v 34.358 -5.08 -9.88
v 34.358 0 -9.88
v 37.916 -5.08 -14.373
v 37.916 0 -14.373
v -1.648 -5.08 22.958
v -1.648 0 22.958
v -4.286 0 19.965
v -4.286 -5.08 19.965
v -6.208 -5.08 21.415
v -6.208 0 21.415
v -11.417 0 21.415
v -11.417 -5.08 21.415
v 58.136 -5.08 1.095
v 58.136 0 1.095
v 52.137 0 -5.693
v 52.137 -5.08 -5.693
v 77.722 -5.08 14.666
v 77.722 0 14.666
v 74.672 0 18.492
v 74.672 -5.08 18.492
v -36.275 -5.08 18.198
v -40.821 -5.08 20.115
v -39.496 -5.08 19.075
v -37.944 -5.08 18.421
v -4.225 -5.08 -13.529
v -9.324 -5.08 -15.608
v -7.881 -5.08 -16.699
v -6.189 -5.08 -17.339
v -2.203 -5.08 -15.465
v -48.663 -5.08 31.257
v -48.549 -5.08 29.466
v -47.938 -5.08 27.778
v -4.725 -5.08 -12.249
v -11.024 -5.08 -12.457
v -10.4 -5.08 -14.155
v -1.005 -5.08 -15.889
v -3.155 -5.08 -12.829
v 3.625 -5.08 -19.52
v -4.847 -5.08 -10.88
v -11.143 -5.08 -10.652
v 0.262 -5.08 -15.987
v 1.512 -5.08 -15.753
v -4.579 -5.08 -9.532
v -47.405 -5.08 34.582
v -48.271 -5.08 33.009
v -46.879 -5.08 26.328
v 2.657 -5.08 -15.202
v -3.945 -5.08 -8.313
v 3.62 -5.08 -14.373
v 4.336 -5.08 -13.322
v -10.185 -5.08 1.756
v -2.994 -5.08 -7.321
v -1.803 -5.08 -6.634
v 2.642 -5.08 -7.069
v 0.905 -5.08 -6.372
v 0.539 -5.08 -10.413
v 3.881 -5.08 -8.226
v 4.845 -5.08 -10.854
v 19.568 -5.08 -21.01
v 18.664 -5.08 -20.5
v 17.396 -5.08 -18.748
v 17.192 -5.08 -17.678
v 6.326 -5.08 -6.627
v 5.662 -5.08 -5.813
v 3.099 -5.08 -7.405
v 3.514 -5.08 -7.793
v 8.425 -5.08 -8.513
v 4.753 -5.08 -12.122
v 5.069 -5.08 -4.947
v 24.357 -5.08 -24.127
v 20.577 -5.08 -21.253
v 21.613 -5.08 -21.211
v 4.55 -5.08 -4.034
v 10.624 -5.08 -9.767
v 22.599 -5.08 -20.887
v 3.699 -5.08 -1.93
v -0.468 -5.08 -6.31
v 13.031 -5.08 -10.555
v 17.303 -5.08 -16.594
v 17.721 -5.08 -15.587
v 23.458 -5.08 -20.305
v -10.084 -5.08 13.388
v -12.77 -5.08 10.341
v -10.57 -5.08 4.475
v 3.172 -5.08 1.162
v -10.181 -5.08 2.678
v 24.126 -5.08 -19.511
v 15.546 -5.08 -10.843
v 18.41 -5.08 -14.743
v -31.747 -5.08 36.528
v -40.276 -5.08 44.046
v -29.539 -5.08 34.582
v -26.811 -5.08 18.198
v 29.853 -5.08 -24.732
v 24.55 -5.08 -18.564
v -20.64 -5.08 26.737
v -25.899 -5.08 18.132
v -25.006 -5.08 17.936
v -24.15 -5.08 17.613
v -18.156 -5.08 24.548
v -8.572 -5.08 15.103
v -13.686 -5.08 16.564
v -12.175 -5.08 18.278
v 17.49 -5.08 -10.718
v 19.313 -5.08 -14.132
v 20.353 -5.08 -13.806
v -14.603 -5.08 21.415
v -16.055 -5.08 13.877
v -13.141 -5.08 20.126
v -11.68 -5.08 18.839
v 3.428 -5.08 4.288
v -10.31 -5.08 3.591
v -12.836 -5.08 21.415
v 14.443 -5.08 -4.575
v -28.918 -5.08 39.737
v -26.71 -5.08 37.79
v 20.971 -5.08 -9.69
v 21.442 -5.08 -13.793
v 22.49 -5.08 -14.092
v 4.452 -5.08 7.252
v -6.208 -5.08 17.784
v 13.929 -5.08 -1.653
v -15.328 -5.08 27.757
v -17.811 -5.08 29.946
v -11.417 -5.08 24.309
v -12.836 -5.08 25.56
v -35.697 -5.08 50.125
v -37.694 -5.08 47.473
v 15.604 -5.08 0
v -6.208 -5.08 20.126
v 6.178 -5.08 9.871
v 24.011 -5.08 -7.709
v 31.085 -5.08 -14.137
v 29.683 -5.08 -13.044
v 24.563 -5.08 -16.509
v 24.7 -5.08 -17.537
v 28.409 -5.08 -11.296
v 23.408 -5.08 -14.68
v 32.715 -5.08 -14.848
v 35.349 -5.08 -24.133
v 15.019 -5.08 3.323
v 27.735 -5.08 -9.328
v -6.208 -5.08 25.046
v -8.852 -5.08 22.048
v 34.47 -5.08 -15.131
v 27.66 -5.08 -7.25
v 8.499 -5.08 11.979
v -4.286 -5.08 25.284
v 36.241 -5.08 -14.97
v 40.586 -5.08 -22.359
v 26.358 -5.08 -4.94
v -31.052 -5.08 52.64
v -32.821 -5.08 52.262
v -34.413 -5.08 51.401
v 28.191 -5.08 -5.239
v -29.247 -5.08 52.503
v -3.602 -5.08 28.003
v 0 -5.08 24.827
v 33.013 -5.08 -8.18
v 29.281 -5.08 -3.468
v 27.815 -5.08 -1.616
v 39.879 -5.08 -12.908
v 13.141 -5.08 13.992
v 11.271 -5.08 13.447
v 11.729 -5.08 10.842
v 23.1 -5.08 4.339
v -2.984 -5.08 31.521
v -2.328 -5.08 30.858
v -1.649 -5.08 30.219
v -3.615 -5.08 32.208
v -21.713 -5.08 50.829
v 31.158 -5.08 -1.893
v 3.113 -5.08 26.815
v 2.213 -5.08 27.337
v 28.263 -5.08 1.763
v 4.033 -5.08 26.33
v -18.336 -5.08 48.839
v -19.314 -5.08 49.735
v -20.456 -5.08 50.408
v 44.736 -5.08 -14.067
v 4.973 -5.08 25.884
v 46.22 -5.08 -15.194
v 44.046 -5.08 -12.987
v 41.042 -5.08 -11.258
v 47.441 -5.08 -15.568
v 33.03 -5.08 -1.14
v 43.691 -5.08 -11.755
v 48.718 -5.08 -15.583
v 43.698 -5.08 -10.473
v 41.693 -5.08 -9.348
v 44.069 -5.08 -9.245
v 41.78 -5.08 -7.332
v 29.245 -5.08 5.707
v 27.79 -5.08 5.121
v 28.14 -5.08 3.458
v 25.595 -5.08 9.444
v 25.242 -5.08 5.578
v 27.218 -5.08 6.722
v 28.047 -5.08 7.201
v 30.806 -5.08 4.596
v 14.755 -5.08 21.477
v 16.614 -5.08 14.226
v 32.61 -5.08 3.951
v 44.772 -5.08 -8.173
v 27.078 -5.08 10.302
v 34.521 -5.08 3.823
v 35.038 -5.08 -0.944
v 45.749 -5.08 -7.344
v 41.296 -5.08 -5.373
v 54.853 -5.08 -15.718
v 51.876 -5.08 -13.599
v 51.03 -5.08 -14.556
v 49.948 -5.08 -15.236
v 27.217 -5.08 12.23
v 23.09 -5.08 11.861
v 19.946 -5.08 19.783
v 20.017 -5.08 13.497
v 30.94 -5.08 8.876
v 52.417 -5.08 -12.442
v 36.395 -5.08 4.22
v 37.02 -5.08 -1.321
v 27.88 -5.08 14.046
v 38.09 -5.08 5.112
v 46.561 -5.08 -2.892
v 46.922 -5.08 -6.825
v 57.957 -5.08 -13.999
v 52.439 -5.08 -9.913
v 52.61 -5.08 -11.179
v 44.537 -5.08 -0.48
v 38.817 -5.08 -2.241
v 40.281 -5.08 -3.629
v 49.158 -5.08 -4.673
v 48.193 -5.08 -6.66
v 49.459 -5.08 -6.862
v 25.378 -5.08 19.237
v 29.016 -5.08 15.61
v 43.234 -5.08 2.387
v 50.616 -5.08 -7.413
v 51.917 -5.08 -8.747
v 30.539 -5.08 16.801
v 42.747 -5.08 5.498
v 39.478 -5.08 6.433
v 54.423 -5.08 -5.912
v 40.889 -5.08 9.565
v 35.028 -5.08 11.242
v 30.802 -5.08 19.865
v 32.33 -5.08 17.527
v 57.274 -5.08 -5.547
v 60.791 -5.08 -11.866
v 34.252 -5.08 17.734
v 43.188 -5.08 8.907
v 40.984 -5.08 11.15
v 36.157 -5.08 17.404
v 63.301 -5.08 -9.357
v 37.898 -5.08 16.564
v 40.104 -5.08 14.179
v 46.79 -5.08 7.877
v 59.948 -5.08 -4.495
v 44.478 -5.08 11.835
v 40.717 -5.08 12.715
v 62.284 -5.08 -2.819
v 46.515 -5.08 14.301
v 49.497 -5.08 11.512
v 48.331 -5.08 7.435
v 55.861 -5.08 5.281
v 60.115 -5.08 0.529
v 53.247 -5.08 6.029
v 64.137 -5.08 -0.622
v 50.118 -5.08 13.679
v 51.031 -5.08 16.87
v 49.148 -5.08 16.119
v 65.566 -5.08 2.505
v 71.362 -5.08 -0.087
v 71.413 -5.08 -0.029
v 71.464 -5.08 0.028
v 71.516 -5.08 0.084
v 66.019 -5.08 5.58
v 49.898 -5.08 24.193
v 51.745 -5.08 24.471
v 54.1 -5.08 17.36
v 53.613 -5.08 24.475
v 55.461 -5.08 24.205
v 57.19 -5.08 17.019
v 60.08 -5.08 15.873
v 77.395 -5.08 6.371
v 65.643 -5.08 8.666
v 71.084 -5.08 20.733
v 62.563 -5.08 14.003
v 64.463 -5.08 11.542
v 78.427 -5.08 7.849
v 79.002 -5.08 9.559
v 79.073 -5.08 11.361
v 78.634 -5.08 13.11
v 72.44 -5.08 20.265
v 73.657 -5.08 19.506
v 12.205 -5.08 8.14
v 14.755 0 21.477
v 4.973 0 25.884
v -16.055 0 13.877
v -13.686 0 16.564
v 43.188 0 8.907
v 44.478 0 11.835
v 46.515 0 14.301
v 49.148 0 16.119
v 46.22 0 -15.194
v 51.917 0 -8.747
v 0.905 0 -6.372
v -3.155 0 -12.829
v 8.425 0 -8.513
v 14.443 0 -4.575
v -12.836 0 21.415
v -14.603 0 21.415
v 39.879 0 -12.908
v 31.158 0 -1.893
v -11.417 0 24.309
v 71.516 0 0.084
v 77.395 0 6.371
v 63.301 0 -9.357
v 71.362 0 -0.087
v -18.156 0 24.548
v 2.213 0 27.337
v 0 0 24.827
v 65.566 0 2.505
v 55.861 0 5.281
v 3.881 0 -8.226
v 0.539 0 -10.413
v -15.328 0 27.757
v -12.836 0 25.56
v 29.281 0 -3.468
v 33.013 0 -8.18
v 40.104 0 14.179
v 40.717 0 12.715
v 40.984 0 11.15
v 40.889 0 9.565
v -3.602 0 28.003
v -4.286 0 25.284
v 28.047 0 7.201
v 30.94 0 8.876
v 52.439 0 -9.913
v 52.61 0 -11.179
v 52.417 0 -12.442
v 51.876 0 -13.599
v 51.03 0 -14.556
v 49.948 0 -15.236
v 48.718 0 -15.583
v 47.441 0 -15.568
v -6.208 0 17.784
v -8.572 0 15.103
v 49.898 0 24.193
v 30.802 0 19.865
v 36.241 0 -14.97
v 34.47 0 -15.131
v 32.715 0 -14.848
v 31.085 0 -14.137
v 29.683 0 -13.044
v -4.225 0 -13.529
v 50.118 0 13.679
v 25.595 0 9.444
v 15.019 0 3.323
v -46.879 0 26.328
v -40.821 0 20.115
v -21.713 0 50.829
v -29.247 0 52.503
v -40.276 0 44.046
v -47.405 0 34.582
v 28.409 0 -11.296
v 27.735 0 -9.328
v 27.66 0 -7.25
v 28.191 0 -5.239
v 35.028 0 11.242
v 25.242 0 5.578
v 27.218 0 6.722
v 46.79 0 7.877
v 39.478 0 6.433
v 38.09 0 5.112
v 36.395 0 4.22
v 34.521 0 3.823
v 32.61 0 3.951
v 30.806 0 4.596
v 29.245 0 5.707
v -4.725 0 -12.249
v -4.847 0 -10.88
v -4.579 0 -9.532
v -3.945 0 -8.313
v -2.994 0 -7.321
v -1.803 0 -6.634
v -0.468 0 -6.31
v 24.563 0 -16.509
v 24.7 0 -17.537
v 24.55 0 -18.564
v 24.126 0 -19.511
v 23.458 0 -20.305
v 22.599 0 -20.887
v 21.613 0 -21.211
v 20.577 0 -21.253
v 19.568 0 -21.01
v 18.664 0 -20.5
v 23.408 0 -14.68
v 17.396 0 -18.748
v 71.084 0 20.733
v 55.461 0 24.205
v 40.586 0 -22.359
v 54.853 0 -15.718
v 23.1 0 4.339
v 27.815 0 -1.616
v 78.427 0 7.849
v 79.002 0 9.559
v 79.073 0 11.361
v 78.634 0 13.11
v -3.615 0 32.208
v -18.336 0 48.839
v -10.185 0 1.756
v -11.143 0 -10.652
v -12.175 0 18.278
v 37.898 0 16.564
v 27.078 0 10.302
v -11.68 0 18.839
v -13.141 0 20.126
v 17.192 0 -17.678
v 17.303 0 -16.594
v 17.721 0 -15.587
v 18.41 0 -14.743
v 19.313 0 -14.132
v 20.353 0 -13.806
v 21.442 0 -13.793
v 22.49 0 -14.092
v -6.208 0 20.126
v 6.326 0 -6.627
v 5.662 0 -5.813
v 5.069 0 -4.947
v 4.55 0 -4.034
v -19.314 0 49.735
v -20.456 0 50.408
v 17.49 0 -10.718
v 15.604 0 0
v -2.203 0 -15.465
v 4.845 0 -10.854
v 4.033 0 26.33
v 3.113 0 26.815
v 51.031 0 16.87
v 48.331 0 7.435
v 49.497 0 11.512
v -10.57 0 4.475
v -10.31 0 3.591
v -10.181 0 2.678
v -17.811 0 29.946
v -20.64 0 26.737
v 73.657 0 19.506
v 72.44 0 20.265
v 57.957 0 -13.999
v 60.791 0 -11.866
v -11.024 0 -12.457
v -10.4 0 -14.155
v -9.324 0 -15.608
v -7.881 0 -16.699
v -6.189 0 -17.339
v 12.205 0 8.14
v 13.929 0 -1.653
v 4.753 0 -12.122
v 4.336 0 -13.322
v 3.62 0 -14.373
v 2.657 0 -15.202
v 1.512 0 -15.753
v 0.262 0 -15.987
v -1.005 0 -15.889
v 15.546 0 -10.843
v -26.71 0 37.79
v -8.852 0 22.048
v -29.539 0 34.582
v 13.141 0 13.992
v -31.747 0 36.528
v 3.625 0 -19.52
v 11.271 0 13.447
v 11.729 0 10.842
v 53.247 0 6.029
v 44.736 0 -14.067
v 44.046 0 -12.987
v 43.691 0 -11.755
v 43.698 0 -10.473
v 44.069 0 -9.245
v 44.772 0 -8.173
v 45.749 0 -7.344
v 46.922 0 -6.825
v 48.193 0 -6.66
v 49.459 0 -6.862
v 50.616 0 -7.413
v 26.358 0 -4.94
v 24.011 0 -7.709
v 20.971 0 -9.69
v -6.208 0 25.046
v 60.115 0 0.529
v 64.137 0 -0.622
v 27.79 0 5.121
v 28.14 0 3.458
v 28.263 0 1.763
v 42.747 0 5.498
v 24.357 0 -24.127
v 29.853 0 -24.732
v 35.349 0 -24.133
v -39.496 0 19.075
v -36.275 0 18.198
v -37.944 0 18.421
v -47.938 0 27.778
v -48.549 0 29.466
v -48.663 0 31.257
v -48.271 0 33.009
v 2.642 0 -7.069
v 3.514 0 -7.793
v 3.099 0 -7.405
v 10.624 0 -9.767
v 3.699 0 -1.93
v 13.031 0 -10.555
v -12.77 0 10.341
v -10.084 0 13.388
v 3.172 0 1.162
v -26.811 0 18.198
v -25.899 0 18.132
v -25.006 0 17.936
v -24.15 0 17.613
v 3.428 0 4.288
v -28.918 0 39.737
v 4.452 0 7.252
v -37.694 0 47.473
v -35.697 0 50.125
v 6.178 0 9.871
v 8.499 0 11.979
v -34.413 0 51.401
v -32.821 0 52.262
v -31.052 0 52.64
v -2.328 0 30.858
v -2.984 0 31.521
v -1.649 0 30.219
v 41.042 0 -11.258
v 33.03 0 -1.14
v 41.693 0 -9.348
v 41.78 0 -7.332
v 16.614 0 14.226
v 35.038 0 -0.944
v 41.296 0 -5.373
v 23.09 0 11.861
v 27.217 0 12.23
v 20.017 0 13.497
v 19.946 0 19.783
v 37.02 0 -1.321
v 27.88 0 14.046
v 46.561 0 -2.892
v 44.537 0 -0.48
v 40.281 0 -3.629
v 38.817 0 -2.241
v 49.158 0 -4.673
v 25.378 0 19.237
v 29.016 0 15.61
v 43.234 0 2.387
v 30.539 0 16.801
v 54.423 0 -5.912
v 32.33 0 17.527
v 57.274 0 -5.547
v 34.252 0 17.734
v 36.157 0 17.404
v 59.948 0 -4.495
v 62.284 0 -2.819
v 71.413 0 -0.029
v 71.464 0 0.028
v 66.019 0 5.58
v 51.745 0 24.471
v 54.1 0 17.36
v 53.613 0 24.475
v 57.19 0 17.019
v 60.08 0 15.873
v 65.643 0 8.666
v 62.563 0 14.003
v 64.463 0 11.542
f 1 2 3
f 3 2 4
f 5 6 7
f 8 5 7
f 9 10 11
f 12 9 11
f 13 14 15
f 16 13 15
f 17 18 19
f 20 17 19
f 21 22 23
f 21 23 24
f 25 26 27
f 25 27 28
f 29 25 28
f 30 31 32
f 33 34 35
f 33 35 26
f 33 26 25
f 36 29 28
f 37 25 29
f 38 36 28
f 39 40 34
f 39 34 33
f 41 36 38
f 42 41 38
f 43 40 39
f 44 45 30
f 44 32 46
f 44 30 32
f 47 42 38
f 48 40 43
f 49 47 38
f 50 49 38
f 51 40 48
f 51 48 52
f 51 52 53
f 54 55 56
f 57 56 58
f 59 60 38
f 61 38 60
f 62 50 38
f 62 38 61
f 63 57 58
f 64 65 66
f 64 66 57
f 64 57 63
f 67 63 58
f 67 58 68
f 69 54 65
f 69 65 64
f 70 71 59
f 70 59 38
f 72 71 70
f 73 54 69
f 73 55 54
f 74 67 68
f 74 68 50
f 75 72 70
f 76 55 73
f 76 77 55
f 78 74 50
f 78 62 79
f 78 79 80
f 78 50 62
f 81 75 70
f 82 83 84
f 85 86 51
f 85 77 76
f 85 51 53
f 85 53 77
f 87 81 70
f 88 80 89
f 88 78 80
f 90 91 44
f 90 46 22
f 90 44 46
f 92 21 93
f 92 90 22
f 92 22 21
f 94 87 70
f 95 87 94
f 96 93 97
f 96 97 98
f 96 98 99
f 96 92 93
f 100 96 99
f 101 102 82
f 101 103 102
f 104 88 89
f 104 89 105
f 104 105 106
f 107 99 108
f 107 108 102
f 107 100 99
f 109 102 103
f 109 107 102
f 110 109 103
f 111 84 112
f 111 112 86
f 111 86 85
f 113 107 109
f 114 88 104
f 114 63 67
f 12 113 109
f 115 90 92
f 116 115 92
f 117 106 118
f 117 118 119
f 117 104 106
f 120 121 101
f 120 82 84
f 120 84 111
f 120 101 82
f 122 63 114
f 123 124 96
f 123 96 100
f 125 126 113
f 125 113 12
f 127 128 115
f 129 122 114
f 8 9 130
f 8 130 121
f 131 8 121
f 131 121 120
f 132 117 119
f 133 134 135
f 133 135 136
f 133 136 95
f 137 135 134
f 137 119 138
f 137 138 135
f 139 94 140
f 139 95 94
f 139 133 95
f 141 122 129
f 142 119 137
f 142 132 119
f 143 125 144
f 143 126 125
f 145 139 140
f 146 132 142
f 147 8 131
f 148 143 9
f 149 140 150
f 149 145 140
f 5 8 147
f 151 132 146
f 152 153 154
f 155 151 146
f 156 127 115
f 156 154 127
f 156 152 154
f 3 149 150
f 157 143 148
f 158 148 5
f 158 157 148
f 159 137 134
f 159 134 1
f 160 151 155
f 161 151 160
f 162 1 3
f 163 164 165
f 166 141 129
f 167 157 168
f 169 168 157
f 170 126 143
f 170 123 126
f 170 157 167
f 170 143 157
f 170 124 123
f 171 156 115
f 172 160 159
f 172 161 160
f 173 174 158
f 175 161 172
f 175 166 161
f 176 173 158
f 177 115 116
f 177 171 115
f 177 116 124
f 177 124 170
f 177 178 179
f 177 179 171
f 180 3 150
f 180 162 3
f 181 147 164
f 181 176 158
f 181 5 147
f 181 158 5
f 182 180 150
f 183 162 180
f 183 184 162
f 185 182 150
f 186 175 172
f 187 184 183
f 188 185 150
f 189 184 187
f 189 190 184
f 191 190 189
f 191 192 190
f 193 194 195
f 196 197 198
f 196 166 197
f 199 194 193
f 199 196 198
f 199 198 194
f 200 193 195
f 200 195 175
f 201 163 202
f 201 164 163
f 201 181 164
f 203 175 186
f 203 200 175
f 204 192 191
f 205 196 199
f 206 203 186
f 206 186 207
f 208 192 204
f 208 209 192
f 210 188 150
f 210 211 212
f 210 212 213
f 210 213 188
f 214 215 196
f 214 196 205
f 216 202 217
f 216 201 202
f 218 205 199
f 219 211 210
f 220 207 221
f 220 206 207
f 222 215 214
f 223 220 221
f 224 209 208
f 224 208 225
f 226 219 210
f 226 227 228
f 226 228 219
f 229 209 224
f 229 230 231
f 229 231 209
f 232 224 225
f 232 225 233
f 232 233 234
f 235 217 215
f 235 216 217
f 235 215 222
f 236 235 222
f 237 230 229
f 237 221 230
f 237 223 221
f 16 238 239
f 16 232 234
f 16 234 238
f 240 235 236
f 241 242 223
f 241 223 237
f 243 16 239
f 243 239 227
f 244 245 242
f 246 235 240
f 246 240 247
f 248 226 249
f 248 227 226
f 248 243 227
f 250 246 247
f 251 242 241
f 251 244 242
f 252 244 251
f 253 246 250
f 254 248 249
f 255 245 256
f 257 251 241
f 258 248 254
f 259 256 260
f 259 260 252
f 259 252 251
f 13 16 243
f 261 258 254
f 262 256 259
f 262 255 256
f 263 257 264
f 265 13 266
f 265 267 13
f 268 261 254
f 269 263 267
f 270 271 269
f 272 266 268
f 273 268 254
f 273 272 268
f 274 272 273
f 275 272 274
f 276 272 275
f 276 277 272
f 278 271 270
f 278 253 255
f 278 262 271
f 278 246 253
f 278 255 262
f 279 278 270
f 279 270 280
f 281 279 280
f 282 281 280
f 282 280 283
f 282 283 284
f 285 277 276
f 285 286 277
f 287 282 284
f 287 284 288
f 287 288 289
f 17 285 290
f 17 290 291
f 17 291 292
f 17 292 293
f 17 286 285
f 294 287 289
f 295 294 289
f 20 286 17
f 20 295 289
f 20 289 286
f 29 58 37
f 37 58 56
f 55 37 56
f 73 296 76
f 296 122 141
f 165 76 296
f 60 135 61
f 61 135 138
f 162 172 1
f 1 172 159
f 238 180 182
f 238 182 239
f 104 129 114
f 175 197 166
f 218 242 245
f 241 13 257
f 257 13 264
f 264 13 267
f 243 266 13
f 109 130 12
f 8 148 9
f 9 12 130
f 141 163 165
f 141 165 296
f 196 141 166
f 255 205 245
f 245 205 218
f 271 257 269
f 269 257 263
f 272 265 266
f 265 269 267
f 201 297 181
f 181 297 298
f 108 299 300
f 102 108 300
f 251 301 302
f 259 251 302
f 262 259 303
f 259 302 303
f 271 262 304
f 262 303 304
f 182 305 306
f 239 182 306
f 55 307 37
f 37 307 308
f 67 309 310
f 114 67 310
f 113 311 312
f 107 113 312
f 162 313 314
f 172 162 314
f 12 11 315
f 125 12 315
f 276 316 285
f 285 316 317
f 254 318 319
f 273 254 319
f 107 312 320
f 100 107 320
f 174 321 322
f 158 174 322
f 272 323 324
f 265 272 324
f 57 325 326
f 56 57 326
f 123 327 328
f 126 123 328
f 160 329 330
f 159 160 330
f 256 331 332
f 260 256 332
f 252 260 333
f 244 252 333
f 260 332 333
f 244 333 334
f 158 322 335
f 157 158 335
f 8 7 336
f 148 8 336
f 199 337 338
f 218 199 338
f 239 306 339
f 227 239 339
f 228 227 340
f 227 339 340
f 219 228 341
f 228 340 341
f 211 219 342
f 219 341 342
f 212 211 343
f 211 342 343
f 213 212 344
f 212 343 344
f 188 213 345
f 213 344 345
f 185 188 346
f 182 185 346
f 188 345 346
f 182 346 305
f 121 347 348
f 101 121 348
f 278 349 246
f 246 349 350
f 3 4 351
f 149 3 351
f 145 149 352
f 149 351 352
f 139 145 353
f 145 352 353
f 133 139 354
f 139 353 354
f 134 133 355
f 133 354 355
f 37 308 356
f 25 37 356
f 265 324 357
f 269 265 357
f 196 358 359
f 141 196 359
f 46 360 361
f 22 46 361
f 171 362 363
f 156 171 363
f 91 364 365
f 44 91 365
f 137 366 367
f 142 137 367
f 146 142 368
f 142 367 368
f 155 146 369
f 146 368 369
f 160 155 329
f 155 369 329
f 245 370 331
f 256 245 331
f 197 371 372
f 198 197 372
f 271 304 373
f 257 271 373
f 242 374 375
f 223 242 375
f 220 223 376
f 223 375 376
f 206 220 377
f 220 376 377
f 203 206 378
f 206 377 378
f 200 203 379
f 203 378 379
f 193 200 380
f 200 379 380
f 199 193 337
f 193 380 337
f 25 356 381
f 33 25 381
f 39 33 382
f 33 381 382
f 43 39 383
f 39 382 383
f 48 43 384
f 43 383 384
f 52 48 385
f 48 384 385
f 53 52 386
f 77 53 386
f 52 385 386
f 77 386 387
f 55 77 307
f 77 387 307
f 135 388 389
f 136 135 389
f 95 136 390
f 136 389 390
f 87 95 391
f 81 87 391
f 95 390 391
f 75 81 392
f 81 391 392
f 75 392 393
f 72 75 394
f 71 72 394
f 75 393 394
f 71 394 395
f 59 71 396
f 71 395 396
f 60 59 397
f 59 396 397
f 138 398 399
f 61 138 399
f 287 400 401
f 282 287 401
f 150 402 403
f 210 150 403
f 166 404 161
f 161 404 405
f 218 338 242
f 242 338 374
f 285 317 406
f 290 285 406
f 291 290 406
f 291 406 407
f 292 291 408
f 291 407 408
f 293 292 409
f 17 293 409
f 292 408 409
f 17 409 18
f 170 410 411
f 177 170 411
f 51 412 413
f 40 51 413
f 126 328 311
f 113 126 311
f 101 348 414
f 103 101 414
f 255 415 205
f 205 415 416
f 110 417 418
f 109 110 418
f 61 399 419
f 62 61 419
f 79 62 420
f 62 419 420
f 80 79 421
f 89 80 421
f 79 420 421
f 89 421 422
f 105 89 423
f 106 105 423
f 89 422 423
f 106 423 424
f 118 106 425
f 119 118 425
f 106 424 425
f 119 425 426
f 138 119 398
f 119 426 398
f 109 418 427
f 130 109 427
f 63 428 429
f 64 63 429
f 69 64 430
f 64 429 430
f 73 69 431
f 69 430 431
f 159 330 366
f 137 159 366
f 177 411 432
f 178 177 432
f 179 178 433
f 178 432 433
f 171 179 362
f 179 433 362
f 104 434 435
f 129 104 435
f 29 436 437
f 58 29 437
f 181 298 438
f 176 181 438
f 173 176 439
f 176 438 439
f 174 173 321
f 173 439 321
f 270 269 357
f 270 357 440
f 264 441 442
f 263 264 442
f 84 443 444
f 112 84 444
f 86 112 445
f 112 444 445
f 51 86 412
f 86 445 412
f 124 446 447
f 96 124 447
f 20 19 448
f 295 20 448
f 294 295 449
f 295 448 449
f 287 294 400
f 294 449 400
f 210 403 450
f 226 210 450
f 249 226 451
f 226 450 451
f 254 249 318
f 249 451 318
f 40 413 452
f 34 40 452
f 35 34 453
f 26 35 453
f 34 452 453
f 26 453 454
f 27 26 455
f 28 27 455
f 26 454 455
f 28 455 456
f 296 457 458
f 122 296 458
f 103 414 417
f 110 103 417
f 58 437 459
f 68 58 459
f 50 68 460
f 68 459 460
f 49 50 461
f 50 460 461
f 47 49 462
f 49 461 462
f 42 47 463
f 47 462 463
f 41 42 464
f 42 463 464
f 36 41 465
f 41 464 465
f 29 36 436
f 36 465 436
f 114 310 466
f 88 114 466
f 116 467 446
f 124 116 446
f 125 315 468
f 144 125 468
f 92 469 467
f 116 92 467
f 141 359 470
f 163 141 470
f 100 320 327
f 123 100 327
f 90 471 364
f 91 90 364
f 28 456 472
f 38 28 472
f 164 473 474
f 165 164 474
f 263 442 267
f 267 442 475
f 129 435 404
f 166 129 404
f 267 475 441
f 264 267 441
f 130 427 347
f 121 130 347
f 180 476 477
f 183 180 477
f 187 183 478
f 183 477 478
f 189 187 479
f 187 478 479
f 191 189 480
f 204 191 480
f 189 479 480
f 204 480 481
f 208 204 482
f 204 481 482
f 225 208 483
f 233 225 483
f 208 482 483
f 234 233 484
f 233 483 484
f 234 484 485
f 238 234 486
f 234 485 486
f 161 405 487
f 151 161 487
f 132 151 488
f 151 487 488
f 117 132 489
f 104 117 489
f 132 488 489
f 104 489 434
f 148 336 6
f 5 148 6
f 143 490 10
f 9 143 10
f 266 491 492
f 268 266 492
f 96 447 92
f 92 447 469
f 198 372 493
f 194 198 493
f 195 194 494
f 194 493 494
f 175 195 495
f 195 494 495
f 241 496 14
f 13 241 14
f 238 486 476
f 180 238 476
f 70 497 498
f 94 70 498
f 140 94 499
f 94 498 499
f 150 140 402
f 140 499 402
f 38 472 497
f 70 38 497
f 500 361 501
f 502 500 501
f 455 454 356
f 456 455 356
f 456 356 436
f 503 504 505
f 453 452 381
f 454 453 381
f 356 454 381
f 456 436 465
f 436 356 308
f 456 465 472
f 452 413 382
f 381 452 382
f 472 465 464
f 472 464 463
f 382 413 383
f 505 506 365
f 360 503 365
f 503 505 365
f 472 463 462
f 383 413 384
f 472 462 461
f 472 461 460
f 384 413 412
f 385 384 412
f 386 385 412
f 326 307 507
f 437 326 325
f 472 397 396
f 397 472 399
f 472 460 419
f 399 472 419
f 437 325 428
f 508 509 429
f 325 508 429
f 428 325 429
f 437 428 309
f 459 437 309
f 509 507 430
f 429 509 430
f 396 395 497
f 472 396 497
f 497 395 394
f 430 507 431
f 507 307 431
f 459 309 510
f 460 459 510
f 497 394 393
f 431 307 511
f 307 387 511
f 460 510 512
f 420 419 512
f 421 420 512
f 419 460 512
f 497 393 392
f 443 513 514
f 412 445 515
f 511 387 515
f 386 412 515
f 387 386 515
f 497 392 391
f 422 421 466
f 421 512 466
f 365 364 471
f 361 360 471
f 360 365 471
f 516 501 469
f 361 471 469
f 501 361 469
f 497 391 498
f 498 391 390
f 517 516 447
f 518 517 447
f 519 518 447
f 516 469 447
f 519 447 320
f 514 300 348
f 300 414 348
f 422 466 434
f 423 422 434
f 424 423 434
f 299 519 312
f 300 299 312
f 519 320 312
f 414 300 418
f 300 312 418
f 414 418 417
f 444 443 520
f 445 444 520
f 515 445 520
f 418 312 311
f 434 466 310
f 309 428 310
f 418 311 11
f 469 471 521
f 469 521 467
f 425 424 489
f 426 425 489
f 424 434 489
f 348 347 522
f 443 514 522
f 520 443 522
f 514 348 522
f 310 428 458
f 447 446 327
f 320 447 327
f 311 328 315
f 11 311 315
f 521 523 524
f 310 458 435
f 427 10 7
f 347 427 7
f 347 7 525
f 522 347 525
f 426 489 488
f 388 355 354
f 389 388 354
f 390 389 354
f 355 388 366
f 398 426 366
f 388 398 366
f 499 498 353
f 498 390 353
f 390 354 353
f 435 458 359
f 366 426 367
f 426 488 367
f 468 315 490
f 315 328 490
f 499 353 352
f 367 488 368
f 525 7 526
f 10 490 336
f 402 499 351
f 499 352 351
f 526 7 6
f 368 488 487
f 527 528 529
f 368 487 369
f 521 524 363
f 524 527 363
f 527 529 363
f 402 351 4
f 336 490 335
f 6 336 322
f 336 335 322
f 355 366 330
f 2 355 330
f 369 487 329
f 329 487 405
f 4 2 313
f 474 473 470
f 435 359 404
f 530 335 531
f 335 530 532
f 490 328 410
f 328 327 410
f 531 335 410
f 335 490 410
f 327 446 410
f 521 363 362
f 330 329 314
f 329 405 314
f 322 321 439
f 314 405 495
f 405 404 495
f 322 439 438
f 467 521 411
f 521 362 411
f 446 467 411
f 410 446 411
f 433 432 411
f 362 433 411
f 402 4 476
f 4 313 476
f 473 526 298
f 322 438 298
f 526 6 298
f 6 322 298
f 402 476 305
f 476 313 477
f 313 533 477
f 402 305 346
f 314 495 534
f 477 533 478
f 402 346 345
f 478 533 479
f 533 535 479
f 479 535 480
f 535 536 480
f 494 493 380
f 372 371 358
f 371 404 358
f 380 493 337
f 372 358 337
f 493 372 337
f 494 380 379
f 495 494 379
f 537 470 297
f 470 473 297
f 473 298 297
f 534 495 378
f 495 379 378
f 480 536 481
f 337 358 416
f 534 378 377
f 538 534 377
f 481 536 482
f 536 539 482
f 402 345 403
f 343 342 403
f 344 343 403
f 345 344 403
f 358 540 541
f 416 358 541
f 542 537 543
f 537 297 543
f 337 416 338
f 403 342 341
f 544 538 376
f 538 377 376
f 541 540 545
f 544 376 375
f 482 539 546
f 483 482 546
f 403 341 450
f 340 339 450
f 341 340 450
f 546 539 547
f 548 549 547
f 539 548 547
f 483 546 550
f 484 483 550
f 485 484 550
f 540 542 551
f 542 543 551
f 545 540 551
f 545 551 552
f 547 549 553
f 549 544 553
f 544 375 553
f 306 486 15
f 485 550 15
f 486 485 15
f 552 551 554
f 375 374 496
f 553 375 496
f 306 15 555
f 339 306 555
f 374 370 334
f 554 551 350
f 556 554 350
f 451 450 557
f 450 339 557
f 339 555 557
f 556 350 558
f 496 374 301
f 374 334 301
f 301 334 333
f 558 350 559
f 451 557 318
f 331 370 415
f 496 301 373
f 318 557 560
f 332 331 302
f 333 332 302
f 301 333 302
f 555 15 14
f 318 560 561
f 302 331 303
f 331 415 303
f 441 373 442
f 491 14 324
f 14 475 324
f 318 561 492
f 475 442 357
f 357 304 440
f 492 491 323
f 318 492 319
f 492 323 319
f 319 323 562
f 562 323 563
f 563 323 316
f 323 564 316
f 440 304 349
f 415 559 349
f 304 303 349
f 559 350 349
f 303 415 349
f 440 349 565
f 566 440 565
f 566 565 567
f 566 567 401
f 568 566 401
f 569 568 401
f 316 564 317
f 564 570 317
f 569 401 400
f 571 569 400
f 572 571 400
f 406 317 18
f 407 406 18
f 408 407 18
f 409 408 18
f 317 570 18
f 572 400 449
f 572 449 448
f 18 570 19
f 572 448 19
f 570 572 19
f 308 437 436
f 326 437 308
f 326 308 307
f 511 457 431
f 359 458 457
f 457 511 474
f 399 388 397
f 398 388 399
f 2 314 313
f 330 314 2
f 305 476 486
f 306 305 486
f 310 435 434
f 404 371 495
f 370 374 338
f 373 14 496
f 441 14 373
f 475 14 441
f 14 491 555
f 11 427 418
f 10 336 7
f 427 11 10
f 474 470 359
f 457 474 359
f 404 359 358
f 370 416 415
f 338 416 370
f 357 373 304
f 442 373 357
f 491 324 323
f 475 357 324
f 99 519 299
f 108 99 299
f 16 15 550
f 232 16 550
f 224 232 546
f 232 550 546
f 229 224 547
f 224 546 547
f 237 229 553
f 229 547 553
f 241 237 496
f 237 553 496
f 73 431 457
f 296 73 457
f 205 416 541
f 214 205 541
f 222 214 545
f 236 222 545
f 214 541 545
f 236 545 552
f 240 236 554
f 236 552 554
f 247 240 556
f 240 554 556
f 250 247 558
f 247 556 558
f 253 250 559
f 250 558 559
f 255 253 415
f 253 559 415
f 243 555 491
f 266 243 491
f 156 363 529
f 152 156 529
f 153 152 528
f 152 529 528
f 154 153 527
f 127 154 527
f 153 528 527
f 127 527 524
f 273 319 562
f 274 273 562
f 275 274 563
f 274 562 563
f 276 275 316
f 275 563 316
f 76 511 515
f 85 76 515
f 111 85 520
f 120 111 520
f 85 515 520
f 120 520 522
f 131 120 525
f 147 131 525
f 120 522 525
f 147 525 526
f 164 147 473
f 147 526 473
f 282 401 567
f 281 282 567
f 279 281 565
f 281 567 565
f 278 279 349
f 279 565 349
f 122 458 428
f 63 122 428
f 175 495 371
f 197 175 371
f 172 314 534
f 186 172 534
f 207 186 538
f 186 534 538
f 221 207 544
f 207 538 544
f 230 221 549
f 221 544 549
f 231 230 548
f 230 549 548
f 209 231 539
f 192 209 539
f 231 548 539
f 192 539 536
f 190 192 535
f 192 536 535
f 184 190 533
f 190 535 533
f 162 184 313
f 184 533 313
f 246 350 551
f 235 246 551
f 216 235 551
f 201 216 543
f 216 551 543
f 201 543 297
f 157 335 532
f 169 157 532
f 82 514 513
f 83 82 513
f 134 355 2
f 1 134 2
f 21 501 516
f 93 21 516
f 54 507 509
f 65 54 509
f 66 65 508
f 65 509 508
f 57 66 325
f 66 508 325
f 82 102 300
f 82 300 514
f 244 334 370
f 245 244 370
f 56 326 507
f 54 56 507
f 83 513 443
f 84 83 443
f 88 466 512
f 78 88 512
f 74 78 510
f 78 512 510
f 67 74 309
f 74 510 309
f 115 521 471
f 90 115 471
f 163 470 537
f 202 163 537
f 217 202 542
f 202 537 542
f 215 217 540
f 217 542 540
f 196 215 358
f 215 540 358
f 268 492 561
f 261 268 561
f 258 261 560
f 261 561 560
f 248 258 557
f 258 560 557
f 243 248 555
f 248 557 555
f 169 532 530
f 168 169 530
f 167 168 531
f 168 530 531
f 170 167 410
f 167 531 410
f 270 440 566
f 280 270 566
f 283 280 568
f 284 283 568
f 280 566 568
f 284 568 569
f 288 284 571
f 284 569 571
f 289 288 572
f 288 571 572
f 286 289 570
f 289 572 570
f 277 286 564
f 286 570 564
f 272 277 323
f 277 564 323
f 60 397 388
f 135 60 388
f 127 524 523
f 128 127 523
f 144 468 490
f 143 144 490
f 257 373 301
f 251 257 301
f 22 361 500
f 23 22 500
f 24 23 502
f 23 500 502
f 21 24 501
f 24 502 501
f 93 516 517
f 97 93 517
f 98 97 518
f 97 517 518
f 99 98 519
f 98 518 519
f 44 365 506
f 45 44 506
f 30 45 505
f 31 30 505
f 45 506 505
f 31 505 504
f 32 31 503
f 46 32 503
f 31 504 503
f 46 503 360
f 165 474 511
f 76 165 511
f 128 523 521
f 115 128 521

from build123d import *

# Parameters (mm, degrees)
F1_DEPTH = 5.08


with BuildPart() as f1:
    # F0 (on Front) → F1 (new body)
    with BuildSketch(Plane.XZ):
        with BuildLine():
            Line((-40.275556, 44.046157), (-47.404758, 34.581525))
            ThreePointArc((-47.404758, 34.581525), (-48.669842, 30.357517), (-46.879273, 26.328058))
            Line((-46.879273, 26.328058), (-40.821373, 20.114827))
            ThreePointArc((-40.821373, 20.114827), (-38.741891, 18.696625), (-36.274772, 18.197764))
            Line((-36.274772, 18.197764), (-26.811405, 18.197764))
            ThreePointArc((-26.811405, 18.197764), (-25.449181, 18.049928), (-24.150386, 17.613306))
            Line((-24.150386, 17.613306), (-16.054588, 13.876783))
            Line((-16.054588, 13.876783), (-13.685921, 16.563832))
            Line((-13.685921, 16.563832), (-10.083565, 13.38831))
            Line((-10.083565, 13.38831), (-12.769917, 10.340875))
            Line((-12.769917, 10.340875), (-10.570144, 4.47481))
            ThreePointArc((-10.570144, 4.47481), (-10.228729, 3.136696), (-10.184672, 1.756416))
            Line((-10.184672, 1.756416), (-11.142575, -10.651773))
            ThreePointArc((-11.142575, -10.651773), (-9.914032, -14.920187), (-6.188922, -17.339322))
            Line((-6.188922, -17.339322), (3.625042, -19.520204))
            Line((3.625042, -19.520204), (24.356571, -24.127213))
            ThreePointArc((24.356571, -24.127213), (32.617279, -24.582682), (40.58616, -22.359246))
            Line((40.58616, -22.359246), (54.85313, -15.717725))
            ThreePointArc((54.85313, -15.717725), (59.411476, -12.982062), (63.300546, -9.357493))
            Line((63.300546, -9.357493), (71.362269, -0.086524))
            ThreePointArc((71.362269, -0.086524), (71.438277, -0.000693), (71.515821, 0.083752))
            Line((71.515821, 0.083752), (77.39452, 6.370687))
            ThreePointArc((77.39452, 6.370687), (79.101388, 10.457233), (77.721958, 14.66561))
            Line((77.721958, 14.66561), (74.67214, 18.491938))
            ThreePointArc((74.67214, 18.491938), (73.070176, 19.919962), (71.084022, 20.732817))
            Line((71.084022, 20.732817), (55.460665, 24.204676))
            ThreePointArc((55.460665, 24.204676), (52.678779, 24.507072), (49.898197, 24.192908))
            Line((49.898197, 24.192908), (30.802289, 19.864502))
            ThreePointArc((30.802289, 19.864502), (22.647473, 19.363428), (14.755452, 21.477216))
            Line((14.755452, 21.477216), (4.972792, 25.88382))
            ThreePointArc((4.972792, 25.88382), (3.570361, 26.568119), (2.212597, 27.337246))
            Line((2.212597, 27.337246), (0, 24.827245))
            Line((0, 24.827245), (-3.602356, 28.002767))
            Line((-3.602356, 28.002767), (-1.648816, 30.21889))
            ThreePointArc((-1.648816, 30.21889), (-2.65924, 31.186265), (-3.614876, 32.207799))
            Line((-3.614876, 32.207799), (-18.335917, 48.839203))
            ThreePointArc((-18.335917, 48.839203), (-19.867203, 50.101377), (-21.713309, 50.82926))
            Line((-21.713309, 50.82926), (-29.24698, 52.50341))
            ThreePointArc((-29.24698, 52.50341), (-32.821418, 52.262474), (-35.696574, 50.125153))
            Line((-35.696574, 50.125153), (-37.694322, 47.472969))
            Line((-37.694322, 47.472969), (-28.918262, 39.736762))
            Line((-28.918262, 39.736762), (-31.746839, 36.527986))
            Line((-31.746839, 36.527986), (-40.275556, 44.046157))
        make_face()
        with BuildLine():
            ThreePointArc((-4.225081, -13.529201), (-3.944831, -8.312931), (0.905035, -6.372102))
            Line((0.905035, -6.372102), (-3.15545, -12.829451))
            Line((-3.15545, -12.829451), (-4.225081, -13.529201))
        make_face(mode=Mode.SUBTRACT)
        with BuildLine():
            ThreePointArc((4.845113, -10.854332), (2.657107, -15.202162), (-2.203116, -15.465267))
            Line((-2.203116, -15.465267), (4.845113, -10.854332))
        make_face(mode=Mode.SUBTRACT)
        with BuildLine():
            ThreePointArc((2.641534, -7.068762), (3.312281, -7.592883), (3.881143, -8.226128))
            Line((3.881143, -8.226128), (0.53884, -10.412655))
            Line((0.53884, -10.412655), (2.641534, -7.068762))
        make_face(mode=Mode.SUBTRACT)
        with BuildLine():
            Line((8.424729, -8.512556), (14.443013, -4.575408))
            Line((14.443013, -4.575408), (15.546219, -10.843349))
            ThreePointArc((15.546219, -10.843349), (11.807481, -10.221791), (8.424729, -8.512556))
        make_face(mode=Mode.SUBTRACT)
        with BuildLine():
            Line((4.550004, -4.03374), (12.205012, 8.139946))
            Line((12.205012, 8.139946), (13.928658, -1.653066))
            Line((13.928658, -1.653066), (6.326088, -6.62665))
            ThreePointArc((6.326088, -6.62665), (5.356567, -5.386006), (4.550004, -4.03374))
        make_face(mode=Mode.SUBTRACT)
        with BuildLine():
            ThreePointArc((3.698579, -1.929555), (4.451633, 7.252294), (11.270996, 13.446624))
            Line((11.270996, 13.446624), (11.729453, 10.841867))
            Line((11.729453, 10.841867), (3.698579, -1.929555))
        make_face(mode=Mode.SUBTRACT)
        with BuildLine():
            ThreePointArc((24.562505, -16.508693), (23.048976, -20.625797), (18.664287, -20.500059))
            Line((18.664287, -20.500059), (24.562505, -16.508693))
        make_face(mode=Mode.SUBTRACT)
        with BuildLine():
            ThreePointArc((17.396329, -18.748226), (18.839082, -14.40465), (23.407693, -14.680293))
            Line((23.407693, -14.680293), (17.396329, -18.748226))
        make_face(mode=Mode.SUBTRACT)
        with BuildLine():
            ThreePointArc((28.408875, -11.295958), (27.6599, -7.249786), (29.281339, -3.467801))
            Line((29.281339, -3.467801), (33.01283, -8.18043))
            Line((33.01283, -8.18043), (28.408875, -11.295958))
        make_face(mode=Mode.SUBTRACT)
        with BuildLine():
            Line((29.683054, -13.043582), (34.358372, -9.879761))
            Line((34.358372, -9.879761), (37.916162, -14.373018))
            ThreePointArc((37.916162, -14.373018), (33.583819, -15.044666), (29.683054, -13.043582))
        make_face(mode=Mode.SUBTRACT)
        with BuildLine():
            ThreePointArc((44.73614, -14.067125), (44.771689, -8.173226), (50.616499, -7.413293))
            Line((50.616499, -7.413293), (44.73614, -14.067125))
        make_face(mode=Mode.SUBTRACT)
        with BuildLine():
            Line((39.879447, -12.907889), (31.157593, -1.892757))
            ThreePointArc((31.157593, -1.892757), (40.281312, -3.629113), (39.879447, -12.907889))
        make_face(mode=Mode.SUBTRACT)
        with BuildLine():
            ThreePointArc((51.917324, -8.746926), (51.486914, -14.107842), (46.21959, -15.194111))
            Line((46.21959, -15.194111), (51.917324, -8.746926))
        make_face(mode=Mode.SUBTRACT)
        with BuildLine():
            Line((17.489936, -10.717827), (15.603516, 0))
            Line((15.603516, 0), (23.100192, 4.338584))
            Line((23.100192, 4.338584), (27.815175, -1.616132))
            ThreePointArc((27.815175, -1.616132), (24.011433, -7.708531), (17.489936, -10.717827))
        make_face(mode=Mode.SUBTRACT)
        with BuildLine():
            Line((28.262959, 1.762977), (25.24207, 5.578162))
            Line((25.24207, 5.578162), (27.217829, 6.721602))
            ThreePointArc((27.217829, 6.721602), (27.993249, 4.295584), (28.262959, 1.762977))
        make_face(mode=Mode.SUBTRACT)
        with BuildLine():
            ThreePointArc((13.140761, 13.992305), (20.017468, 13.496749), (25.594964, 9.443823))
            Line((25.594964, 9.443823), (15.018651, 3.322948))
            Line((15.018651, 3.322948), (13.140761, 13.992305))
        make_face(mode=Mode.SUBTRACT)
        with BuildLine():
            Line((30.93997, 8.875732), (39.47801, 6.432929))
            ThreePointArc((39.47801, 6.432929), (33.560944, 3.82119), (28.046584, 7.201231))
            Line((28.046584, 7.201231), (30.93997, 8.875732))
        make_face(mode=Mode.SUBTRACT)
        with BuildLine():
            Line((40.888753, 9.564819), (35.028014, 11.241624))
            Line((35.028014, 11.241624), (40.103703, 14.1791))
            ThreePointArc((40.103703, 14.1791), (40.895382, 11.939869), (40.888753, 9.564819))
        make_face(mode=Mode.SUBTRACT)
        with BuildLine():
            Line((46.789589, 7.876541), (43.188322, 8.906893))
            ThreePointArc((43.188322, 8.906893), (45.411398, 13.138456), (49.147954, 16.119453))
            Line((49.147954, 16.119453), (46.789589, 7.876541))
        make_face(mode=Mode.SUBTRACT)
        with BuildLine():
            Line((54.422703, -5.912002), (60.114638, 0.528621))
            Line((60.114638, 0.528621), (64.136762, -0.622142))
            ThreePointArc((64.136762, -0.622142), (59.948363, -4.494914), (54.422703, -5.912002))
        make_face(mode=Mode.SUBTRACT)
        with BuildLine():
            ThreePointArc((52.13659, -5.693258), (45.467392, -1.754529), (42.747289, 5.497562))
            Line((42.747289, 5.497562), (58.135606, 1.094838))
            Line((58.135606, 1.094838), (52.13659, -5.693258))
        make_face(mode=Mode.SUBTRACT)
        Polygon((53.247314, 6.028933), (48.331221, 7.435468), (49.497491, 11.511795), align=None, mode=Mode.SUBTRACT)
        with BuildLine():
            ThreePointArc((51.030518, 16.87), (62.563308, 14.002848), (65.565734, 2.504533))
            Line((65.565734, 2.504533), (55.861395, 5.281023))
            Line((55.861395, 5.281023), (50.117643, 13.679339))
            Line((50.117643, 13.679339), (51.030518, 16.87))
        make_face(mode=Mode.SUBTRACT)
        Polygon((-20.639595, 26.73681), (-29.538747, 34.581525), (-26.71017, 37.790301), (-17.811018, 29.945587), align=None, mode=Mode.SUBTRACT)
        Polygon((-6.20836, 17.784396), (-8.572314, 15.102694), (-12.17467, 18.278216), (-11.680279, 18.83906), (-13.1406, 20.126352), (-6.20836, 20.126352), align=None, mode=Mode.SUBTRACT)
        Polygon((-11.416613, 24.308838), (-8.851702, 22.047837), (-6.20836, 25.04648), (-6.20836, 21.415438), (-11.416613, 21.415438), align=None, mode=Mode.SUBTRACT)
        Polygon((-4.286453, 19.964633), (-4.286453, 25.283757), (-1.647903, 22.957841), align=None, mode=Mode.SUBTRACT)
        Polygon((-14.602957, 21.415438), (-18.15631, 24.547764), (-15.327734, 27.75654), (-12.835704, 25.559785), (-12.835704, 21.415438), align=None, mode=Mode.SUBTRACT)
        with BuildLine():
            Line((37.897688, 16.563832), (27.077917, 10.302059))
            ThreePointArc((27.077917, 10.302059), (30.53882, 16.800609), (37.897688, 16.563832))
        make_face(mode=Mode.SUBTRACT)
    extrude(amount=F1_DEPTH)


solid = f1.part
